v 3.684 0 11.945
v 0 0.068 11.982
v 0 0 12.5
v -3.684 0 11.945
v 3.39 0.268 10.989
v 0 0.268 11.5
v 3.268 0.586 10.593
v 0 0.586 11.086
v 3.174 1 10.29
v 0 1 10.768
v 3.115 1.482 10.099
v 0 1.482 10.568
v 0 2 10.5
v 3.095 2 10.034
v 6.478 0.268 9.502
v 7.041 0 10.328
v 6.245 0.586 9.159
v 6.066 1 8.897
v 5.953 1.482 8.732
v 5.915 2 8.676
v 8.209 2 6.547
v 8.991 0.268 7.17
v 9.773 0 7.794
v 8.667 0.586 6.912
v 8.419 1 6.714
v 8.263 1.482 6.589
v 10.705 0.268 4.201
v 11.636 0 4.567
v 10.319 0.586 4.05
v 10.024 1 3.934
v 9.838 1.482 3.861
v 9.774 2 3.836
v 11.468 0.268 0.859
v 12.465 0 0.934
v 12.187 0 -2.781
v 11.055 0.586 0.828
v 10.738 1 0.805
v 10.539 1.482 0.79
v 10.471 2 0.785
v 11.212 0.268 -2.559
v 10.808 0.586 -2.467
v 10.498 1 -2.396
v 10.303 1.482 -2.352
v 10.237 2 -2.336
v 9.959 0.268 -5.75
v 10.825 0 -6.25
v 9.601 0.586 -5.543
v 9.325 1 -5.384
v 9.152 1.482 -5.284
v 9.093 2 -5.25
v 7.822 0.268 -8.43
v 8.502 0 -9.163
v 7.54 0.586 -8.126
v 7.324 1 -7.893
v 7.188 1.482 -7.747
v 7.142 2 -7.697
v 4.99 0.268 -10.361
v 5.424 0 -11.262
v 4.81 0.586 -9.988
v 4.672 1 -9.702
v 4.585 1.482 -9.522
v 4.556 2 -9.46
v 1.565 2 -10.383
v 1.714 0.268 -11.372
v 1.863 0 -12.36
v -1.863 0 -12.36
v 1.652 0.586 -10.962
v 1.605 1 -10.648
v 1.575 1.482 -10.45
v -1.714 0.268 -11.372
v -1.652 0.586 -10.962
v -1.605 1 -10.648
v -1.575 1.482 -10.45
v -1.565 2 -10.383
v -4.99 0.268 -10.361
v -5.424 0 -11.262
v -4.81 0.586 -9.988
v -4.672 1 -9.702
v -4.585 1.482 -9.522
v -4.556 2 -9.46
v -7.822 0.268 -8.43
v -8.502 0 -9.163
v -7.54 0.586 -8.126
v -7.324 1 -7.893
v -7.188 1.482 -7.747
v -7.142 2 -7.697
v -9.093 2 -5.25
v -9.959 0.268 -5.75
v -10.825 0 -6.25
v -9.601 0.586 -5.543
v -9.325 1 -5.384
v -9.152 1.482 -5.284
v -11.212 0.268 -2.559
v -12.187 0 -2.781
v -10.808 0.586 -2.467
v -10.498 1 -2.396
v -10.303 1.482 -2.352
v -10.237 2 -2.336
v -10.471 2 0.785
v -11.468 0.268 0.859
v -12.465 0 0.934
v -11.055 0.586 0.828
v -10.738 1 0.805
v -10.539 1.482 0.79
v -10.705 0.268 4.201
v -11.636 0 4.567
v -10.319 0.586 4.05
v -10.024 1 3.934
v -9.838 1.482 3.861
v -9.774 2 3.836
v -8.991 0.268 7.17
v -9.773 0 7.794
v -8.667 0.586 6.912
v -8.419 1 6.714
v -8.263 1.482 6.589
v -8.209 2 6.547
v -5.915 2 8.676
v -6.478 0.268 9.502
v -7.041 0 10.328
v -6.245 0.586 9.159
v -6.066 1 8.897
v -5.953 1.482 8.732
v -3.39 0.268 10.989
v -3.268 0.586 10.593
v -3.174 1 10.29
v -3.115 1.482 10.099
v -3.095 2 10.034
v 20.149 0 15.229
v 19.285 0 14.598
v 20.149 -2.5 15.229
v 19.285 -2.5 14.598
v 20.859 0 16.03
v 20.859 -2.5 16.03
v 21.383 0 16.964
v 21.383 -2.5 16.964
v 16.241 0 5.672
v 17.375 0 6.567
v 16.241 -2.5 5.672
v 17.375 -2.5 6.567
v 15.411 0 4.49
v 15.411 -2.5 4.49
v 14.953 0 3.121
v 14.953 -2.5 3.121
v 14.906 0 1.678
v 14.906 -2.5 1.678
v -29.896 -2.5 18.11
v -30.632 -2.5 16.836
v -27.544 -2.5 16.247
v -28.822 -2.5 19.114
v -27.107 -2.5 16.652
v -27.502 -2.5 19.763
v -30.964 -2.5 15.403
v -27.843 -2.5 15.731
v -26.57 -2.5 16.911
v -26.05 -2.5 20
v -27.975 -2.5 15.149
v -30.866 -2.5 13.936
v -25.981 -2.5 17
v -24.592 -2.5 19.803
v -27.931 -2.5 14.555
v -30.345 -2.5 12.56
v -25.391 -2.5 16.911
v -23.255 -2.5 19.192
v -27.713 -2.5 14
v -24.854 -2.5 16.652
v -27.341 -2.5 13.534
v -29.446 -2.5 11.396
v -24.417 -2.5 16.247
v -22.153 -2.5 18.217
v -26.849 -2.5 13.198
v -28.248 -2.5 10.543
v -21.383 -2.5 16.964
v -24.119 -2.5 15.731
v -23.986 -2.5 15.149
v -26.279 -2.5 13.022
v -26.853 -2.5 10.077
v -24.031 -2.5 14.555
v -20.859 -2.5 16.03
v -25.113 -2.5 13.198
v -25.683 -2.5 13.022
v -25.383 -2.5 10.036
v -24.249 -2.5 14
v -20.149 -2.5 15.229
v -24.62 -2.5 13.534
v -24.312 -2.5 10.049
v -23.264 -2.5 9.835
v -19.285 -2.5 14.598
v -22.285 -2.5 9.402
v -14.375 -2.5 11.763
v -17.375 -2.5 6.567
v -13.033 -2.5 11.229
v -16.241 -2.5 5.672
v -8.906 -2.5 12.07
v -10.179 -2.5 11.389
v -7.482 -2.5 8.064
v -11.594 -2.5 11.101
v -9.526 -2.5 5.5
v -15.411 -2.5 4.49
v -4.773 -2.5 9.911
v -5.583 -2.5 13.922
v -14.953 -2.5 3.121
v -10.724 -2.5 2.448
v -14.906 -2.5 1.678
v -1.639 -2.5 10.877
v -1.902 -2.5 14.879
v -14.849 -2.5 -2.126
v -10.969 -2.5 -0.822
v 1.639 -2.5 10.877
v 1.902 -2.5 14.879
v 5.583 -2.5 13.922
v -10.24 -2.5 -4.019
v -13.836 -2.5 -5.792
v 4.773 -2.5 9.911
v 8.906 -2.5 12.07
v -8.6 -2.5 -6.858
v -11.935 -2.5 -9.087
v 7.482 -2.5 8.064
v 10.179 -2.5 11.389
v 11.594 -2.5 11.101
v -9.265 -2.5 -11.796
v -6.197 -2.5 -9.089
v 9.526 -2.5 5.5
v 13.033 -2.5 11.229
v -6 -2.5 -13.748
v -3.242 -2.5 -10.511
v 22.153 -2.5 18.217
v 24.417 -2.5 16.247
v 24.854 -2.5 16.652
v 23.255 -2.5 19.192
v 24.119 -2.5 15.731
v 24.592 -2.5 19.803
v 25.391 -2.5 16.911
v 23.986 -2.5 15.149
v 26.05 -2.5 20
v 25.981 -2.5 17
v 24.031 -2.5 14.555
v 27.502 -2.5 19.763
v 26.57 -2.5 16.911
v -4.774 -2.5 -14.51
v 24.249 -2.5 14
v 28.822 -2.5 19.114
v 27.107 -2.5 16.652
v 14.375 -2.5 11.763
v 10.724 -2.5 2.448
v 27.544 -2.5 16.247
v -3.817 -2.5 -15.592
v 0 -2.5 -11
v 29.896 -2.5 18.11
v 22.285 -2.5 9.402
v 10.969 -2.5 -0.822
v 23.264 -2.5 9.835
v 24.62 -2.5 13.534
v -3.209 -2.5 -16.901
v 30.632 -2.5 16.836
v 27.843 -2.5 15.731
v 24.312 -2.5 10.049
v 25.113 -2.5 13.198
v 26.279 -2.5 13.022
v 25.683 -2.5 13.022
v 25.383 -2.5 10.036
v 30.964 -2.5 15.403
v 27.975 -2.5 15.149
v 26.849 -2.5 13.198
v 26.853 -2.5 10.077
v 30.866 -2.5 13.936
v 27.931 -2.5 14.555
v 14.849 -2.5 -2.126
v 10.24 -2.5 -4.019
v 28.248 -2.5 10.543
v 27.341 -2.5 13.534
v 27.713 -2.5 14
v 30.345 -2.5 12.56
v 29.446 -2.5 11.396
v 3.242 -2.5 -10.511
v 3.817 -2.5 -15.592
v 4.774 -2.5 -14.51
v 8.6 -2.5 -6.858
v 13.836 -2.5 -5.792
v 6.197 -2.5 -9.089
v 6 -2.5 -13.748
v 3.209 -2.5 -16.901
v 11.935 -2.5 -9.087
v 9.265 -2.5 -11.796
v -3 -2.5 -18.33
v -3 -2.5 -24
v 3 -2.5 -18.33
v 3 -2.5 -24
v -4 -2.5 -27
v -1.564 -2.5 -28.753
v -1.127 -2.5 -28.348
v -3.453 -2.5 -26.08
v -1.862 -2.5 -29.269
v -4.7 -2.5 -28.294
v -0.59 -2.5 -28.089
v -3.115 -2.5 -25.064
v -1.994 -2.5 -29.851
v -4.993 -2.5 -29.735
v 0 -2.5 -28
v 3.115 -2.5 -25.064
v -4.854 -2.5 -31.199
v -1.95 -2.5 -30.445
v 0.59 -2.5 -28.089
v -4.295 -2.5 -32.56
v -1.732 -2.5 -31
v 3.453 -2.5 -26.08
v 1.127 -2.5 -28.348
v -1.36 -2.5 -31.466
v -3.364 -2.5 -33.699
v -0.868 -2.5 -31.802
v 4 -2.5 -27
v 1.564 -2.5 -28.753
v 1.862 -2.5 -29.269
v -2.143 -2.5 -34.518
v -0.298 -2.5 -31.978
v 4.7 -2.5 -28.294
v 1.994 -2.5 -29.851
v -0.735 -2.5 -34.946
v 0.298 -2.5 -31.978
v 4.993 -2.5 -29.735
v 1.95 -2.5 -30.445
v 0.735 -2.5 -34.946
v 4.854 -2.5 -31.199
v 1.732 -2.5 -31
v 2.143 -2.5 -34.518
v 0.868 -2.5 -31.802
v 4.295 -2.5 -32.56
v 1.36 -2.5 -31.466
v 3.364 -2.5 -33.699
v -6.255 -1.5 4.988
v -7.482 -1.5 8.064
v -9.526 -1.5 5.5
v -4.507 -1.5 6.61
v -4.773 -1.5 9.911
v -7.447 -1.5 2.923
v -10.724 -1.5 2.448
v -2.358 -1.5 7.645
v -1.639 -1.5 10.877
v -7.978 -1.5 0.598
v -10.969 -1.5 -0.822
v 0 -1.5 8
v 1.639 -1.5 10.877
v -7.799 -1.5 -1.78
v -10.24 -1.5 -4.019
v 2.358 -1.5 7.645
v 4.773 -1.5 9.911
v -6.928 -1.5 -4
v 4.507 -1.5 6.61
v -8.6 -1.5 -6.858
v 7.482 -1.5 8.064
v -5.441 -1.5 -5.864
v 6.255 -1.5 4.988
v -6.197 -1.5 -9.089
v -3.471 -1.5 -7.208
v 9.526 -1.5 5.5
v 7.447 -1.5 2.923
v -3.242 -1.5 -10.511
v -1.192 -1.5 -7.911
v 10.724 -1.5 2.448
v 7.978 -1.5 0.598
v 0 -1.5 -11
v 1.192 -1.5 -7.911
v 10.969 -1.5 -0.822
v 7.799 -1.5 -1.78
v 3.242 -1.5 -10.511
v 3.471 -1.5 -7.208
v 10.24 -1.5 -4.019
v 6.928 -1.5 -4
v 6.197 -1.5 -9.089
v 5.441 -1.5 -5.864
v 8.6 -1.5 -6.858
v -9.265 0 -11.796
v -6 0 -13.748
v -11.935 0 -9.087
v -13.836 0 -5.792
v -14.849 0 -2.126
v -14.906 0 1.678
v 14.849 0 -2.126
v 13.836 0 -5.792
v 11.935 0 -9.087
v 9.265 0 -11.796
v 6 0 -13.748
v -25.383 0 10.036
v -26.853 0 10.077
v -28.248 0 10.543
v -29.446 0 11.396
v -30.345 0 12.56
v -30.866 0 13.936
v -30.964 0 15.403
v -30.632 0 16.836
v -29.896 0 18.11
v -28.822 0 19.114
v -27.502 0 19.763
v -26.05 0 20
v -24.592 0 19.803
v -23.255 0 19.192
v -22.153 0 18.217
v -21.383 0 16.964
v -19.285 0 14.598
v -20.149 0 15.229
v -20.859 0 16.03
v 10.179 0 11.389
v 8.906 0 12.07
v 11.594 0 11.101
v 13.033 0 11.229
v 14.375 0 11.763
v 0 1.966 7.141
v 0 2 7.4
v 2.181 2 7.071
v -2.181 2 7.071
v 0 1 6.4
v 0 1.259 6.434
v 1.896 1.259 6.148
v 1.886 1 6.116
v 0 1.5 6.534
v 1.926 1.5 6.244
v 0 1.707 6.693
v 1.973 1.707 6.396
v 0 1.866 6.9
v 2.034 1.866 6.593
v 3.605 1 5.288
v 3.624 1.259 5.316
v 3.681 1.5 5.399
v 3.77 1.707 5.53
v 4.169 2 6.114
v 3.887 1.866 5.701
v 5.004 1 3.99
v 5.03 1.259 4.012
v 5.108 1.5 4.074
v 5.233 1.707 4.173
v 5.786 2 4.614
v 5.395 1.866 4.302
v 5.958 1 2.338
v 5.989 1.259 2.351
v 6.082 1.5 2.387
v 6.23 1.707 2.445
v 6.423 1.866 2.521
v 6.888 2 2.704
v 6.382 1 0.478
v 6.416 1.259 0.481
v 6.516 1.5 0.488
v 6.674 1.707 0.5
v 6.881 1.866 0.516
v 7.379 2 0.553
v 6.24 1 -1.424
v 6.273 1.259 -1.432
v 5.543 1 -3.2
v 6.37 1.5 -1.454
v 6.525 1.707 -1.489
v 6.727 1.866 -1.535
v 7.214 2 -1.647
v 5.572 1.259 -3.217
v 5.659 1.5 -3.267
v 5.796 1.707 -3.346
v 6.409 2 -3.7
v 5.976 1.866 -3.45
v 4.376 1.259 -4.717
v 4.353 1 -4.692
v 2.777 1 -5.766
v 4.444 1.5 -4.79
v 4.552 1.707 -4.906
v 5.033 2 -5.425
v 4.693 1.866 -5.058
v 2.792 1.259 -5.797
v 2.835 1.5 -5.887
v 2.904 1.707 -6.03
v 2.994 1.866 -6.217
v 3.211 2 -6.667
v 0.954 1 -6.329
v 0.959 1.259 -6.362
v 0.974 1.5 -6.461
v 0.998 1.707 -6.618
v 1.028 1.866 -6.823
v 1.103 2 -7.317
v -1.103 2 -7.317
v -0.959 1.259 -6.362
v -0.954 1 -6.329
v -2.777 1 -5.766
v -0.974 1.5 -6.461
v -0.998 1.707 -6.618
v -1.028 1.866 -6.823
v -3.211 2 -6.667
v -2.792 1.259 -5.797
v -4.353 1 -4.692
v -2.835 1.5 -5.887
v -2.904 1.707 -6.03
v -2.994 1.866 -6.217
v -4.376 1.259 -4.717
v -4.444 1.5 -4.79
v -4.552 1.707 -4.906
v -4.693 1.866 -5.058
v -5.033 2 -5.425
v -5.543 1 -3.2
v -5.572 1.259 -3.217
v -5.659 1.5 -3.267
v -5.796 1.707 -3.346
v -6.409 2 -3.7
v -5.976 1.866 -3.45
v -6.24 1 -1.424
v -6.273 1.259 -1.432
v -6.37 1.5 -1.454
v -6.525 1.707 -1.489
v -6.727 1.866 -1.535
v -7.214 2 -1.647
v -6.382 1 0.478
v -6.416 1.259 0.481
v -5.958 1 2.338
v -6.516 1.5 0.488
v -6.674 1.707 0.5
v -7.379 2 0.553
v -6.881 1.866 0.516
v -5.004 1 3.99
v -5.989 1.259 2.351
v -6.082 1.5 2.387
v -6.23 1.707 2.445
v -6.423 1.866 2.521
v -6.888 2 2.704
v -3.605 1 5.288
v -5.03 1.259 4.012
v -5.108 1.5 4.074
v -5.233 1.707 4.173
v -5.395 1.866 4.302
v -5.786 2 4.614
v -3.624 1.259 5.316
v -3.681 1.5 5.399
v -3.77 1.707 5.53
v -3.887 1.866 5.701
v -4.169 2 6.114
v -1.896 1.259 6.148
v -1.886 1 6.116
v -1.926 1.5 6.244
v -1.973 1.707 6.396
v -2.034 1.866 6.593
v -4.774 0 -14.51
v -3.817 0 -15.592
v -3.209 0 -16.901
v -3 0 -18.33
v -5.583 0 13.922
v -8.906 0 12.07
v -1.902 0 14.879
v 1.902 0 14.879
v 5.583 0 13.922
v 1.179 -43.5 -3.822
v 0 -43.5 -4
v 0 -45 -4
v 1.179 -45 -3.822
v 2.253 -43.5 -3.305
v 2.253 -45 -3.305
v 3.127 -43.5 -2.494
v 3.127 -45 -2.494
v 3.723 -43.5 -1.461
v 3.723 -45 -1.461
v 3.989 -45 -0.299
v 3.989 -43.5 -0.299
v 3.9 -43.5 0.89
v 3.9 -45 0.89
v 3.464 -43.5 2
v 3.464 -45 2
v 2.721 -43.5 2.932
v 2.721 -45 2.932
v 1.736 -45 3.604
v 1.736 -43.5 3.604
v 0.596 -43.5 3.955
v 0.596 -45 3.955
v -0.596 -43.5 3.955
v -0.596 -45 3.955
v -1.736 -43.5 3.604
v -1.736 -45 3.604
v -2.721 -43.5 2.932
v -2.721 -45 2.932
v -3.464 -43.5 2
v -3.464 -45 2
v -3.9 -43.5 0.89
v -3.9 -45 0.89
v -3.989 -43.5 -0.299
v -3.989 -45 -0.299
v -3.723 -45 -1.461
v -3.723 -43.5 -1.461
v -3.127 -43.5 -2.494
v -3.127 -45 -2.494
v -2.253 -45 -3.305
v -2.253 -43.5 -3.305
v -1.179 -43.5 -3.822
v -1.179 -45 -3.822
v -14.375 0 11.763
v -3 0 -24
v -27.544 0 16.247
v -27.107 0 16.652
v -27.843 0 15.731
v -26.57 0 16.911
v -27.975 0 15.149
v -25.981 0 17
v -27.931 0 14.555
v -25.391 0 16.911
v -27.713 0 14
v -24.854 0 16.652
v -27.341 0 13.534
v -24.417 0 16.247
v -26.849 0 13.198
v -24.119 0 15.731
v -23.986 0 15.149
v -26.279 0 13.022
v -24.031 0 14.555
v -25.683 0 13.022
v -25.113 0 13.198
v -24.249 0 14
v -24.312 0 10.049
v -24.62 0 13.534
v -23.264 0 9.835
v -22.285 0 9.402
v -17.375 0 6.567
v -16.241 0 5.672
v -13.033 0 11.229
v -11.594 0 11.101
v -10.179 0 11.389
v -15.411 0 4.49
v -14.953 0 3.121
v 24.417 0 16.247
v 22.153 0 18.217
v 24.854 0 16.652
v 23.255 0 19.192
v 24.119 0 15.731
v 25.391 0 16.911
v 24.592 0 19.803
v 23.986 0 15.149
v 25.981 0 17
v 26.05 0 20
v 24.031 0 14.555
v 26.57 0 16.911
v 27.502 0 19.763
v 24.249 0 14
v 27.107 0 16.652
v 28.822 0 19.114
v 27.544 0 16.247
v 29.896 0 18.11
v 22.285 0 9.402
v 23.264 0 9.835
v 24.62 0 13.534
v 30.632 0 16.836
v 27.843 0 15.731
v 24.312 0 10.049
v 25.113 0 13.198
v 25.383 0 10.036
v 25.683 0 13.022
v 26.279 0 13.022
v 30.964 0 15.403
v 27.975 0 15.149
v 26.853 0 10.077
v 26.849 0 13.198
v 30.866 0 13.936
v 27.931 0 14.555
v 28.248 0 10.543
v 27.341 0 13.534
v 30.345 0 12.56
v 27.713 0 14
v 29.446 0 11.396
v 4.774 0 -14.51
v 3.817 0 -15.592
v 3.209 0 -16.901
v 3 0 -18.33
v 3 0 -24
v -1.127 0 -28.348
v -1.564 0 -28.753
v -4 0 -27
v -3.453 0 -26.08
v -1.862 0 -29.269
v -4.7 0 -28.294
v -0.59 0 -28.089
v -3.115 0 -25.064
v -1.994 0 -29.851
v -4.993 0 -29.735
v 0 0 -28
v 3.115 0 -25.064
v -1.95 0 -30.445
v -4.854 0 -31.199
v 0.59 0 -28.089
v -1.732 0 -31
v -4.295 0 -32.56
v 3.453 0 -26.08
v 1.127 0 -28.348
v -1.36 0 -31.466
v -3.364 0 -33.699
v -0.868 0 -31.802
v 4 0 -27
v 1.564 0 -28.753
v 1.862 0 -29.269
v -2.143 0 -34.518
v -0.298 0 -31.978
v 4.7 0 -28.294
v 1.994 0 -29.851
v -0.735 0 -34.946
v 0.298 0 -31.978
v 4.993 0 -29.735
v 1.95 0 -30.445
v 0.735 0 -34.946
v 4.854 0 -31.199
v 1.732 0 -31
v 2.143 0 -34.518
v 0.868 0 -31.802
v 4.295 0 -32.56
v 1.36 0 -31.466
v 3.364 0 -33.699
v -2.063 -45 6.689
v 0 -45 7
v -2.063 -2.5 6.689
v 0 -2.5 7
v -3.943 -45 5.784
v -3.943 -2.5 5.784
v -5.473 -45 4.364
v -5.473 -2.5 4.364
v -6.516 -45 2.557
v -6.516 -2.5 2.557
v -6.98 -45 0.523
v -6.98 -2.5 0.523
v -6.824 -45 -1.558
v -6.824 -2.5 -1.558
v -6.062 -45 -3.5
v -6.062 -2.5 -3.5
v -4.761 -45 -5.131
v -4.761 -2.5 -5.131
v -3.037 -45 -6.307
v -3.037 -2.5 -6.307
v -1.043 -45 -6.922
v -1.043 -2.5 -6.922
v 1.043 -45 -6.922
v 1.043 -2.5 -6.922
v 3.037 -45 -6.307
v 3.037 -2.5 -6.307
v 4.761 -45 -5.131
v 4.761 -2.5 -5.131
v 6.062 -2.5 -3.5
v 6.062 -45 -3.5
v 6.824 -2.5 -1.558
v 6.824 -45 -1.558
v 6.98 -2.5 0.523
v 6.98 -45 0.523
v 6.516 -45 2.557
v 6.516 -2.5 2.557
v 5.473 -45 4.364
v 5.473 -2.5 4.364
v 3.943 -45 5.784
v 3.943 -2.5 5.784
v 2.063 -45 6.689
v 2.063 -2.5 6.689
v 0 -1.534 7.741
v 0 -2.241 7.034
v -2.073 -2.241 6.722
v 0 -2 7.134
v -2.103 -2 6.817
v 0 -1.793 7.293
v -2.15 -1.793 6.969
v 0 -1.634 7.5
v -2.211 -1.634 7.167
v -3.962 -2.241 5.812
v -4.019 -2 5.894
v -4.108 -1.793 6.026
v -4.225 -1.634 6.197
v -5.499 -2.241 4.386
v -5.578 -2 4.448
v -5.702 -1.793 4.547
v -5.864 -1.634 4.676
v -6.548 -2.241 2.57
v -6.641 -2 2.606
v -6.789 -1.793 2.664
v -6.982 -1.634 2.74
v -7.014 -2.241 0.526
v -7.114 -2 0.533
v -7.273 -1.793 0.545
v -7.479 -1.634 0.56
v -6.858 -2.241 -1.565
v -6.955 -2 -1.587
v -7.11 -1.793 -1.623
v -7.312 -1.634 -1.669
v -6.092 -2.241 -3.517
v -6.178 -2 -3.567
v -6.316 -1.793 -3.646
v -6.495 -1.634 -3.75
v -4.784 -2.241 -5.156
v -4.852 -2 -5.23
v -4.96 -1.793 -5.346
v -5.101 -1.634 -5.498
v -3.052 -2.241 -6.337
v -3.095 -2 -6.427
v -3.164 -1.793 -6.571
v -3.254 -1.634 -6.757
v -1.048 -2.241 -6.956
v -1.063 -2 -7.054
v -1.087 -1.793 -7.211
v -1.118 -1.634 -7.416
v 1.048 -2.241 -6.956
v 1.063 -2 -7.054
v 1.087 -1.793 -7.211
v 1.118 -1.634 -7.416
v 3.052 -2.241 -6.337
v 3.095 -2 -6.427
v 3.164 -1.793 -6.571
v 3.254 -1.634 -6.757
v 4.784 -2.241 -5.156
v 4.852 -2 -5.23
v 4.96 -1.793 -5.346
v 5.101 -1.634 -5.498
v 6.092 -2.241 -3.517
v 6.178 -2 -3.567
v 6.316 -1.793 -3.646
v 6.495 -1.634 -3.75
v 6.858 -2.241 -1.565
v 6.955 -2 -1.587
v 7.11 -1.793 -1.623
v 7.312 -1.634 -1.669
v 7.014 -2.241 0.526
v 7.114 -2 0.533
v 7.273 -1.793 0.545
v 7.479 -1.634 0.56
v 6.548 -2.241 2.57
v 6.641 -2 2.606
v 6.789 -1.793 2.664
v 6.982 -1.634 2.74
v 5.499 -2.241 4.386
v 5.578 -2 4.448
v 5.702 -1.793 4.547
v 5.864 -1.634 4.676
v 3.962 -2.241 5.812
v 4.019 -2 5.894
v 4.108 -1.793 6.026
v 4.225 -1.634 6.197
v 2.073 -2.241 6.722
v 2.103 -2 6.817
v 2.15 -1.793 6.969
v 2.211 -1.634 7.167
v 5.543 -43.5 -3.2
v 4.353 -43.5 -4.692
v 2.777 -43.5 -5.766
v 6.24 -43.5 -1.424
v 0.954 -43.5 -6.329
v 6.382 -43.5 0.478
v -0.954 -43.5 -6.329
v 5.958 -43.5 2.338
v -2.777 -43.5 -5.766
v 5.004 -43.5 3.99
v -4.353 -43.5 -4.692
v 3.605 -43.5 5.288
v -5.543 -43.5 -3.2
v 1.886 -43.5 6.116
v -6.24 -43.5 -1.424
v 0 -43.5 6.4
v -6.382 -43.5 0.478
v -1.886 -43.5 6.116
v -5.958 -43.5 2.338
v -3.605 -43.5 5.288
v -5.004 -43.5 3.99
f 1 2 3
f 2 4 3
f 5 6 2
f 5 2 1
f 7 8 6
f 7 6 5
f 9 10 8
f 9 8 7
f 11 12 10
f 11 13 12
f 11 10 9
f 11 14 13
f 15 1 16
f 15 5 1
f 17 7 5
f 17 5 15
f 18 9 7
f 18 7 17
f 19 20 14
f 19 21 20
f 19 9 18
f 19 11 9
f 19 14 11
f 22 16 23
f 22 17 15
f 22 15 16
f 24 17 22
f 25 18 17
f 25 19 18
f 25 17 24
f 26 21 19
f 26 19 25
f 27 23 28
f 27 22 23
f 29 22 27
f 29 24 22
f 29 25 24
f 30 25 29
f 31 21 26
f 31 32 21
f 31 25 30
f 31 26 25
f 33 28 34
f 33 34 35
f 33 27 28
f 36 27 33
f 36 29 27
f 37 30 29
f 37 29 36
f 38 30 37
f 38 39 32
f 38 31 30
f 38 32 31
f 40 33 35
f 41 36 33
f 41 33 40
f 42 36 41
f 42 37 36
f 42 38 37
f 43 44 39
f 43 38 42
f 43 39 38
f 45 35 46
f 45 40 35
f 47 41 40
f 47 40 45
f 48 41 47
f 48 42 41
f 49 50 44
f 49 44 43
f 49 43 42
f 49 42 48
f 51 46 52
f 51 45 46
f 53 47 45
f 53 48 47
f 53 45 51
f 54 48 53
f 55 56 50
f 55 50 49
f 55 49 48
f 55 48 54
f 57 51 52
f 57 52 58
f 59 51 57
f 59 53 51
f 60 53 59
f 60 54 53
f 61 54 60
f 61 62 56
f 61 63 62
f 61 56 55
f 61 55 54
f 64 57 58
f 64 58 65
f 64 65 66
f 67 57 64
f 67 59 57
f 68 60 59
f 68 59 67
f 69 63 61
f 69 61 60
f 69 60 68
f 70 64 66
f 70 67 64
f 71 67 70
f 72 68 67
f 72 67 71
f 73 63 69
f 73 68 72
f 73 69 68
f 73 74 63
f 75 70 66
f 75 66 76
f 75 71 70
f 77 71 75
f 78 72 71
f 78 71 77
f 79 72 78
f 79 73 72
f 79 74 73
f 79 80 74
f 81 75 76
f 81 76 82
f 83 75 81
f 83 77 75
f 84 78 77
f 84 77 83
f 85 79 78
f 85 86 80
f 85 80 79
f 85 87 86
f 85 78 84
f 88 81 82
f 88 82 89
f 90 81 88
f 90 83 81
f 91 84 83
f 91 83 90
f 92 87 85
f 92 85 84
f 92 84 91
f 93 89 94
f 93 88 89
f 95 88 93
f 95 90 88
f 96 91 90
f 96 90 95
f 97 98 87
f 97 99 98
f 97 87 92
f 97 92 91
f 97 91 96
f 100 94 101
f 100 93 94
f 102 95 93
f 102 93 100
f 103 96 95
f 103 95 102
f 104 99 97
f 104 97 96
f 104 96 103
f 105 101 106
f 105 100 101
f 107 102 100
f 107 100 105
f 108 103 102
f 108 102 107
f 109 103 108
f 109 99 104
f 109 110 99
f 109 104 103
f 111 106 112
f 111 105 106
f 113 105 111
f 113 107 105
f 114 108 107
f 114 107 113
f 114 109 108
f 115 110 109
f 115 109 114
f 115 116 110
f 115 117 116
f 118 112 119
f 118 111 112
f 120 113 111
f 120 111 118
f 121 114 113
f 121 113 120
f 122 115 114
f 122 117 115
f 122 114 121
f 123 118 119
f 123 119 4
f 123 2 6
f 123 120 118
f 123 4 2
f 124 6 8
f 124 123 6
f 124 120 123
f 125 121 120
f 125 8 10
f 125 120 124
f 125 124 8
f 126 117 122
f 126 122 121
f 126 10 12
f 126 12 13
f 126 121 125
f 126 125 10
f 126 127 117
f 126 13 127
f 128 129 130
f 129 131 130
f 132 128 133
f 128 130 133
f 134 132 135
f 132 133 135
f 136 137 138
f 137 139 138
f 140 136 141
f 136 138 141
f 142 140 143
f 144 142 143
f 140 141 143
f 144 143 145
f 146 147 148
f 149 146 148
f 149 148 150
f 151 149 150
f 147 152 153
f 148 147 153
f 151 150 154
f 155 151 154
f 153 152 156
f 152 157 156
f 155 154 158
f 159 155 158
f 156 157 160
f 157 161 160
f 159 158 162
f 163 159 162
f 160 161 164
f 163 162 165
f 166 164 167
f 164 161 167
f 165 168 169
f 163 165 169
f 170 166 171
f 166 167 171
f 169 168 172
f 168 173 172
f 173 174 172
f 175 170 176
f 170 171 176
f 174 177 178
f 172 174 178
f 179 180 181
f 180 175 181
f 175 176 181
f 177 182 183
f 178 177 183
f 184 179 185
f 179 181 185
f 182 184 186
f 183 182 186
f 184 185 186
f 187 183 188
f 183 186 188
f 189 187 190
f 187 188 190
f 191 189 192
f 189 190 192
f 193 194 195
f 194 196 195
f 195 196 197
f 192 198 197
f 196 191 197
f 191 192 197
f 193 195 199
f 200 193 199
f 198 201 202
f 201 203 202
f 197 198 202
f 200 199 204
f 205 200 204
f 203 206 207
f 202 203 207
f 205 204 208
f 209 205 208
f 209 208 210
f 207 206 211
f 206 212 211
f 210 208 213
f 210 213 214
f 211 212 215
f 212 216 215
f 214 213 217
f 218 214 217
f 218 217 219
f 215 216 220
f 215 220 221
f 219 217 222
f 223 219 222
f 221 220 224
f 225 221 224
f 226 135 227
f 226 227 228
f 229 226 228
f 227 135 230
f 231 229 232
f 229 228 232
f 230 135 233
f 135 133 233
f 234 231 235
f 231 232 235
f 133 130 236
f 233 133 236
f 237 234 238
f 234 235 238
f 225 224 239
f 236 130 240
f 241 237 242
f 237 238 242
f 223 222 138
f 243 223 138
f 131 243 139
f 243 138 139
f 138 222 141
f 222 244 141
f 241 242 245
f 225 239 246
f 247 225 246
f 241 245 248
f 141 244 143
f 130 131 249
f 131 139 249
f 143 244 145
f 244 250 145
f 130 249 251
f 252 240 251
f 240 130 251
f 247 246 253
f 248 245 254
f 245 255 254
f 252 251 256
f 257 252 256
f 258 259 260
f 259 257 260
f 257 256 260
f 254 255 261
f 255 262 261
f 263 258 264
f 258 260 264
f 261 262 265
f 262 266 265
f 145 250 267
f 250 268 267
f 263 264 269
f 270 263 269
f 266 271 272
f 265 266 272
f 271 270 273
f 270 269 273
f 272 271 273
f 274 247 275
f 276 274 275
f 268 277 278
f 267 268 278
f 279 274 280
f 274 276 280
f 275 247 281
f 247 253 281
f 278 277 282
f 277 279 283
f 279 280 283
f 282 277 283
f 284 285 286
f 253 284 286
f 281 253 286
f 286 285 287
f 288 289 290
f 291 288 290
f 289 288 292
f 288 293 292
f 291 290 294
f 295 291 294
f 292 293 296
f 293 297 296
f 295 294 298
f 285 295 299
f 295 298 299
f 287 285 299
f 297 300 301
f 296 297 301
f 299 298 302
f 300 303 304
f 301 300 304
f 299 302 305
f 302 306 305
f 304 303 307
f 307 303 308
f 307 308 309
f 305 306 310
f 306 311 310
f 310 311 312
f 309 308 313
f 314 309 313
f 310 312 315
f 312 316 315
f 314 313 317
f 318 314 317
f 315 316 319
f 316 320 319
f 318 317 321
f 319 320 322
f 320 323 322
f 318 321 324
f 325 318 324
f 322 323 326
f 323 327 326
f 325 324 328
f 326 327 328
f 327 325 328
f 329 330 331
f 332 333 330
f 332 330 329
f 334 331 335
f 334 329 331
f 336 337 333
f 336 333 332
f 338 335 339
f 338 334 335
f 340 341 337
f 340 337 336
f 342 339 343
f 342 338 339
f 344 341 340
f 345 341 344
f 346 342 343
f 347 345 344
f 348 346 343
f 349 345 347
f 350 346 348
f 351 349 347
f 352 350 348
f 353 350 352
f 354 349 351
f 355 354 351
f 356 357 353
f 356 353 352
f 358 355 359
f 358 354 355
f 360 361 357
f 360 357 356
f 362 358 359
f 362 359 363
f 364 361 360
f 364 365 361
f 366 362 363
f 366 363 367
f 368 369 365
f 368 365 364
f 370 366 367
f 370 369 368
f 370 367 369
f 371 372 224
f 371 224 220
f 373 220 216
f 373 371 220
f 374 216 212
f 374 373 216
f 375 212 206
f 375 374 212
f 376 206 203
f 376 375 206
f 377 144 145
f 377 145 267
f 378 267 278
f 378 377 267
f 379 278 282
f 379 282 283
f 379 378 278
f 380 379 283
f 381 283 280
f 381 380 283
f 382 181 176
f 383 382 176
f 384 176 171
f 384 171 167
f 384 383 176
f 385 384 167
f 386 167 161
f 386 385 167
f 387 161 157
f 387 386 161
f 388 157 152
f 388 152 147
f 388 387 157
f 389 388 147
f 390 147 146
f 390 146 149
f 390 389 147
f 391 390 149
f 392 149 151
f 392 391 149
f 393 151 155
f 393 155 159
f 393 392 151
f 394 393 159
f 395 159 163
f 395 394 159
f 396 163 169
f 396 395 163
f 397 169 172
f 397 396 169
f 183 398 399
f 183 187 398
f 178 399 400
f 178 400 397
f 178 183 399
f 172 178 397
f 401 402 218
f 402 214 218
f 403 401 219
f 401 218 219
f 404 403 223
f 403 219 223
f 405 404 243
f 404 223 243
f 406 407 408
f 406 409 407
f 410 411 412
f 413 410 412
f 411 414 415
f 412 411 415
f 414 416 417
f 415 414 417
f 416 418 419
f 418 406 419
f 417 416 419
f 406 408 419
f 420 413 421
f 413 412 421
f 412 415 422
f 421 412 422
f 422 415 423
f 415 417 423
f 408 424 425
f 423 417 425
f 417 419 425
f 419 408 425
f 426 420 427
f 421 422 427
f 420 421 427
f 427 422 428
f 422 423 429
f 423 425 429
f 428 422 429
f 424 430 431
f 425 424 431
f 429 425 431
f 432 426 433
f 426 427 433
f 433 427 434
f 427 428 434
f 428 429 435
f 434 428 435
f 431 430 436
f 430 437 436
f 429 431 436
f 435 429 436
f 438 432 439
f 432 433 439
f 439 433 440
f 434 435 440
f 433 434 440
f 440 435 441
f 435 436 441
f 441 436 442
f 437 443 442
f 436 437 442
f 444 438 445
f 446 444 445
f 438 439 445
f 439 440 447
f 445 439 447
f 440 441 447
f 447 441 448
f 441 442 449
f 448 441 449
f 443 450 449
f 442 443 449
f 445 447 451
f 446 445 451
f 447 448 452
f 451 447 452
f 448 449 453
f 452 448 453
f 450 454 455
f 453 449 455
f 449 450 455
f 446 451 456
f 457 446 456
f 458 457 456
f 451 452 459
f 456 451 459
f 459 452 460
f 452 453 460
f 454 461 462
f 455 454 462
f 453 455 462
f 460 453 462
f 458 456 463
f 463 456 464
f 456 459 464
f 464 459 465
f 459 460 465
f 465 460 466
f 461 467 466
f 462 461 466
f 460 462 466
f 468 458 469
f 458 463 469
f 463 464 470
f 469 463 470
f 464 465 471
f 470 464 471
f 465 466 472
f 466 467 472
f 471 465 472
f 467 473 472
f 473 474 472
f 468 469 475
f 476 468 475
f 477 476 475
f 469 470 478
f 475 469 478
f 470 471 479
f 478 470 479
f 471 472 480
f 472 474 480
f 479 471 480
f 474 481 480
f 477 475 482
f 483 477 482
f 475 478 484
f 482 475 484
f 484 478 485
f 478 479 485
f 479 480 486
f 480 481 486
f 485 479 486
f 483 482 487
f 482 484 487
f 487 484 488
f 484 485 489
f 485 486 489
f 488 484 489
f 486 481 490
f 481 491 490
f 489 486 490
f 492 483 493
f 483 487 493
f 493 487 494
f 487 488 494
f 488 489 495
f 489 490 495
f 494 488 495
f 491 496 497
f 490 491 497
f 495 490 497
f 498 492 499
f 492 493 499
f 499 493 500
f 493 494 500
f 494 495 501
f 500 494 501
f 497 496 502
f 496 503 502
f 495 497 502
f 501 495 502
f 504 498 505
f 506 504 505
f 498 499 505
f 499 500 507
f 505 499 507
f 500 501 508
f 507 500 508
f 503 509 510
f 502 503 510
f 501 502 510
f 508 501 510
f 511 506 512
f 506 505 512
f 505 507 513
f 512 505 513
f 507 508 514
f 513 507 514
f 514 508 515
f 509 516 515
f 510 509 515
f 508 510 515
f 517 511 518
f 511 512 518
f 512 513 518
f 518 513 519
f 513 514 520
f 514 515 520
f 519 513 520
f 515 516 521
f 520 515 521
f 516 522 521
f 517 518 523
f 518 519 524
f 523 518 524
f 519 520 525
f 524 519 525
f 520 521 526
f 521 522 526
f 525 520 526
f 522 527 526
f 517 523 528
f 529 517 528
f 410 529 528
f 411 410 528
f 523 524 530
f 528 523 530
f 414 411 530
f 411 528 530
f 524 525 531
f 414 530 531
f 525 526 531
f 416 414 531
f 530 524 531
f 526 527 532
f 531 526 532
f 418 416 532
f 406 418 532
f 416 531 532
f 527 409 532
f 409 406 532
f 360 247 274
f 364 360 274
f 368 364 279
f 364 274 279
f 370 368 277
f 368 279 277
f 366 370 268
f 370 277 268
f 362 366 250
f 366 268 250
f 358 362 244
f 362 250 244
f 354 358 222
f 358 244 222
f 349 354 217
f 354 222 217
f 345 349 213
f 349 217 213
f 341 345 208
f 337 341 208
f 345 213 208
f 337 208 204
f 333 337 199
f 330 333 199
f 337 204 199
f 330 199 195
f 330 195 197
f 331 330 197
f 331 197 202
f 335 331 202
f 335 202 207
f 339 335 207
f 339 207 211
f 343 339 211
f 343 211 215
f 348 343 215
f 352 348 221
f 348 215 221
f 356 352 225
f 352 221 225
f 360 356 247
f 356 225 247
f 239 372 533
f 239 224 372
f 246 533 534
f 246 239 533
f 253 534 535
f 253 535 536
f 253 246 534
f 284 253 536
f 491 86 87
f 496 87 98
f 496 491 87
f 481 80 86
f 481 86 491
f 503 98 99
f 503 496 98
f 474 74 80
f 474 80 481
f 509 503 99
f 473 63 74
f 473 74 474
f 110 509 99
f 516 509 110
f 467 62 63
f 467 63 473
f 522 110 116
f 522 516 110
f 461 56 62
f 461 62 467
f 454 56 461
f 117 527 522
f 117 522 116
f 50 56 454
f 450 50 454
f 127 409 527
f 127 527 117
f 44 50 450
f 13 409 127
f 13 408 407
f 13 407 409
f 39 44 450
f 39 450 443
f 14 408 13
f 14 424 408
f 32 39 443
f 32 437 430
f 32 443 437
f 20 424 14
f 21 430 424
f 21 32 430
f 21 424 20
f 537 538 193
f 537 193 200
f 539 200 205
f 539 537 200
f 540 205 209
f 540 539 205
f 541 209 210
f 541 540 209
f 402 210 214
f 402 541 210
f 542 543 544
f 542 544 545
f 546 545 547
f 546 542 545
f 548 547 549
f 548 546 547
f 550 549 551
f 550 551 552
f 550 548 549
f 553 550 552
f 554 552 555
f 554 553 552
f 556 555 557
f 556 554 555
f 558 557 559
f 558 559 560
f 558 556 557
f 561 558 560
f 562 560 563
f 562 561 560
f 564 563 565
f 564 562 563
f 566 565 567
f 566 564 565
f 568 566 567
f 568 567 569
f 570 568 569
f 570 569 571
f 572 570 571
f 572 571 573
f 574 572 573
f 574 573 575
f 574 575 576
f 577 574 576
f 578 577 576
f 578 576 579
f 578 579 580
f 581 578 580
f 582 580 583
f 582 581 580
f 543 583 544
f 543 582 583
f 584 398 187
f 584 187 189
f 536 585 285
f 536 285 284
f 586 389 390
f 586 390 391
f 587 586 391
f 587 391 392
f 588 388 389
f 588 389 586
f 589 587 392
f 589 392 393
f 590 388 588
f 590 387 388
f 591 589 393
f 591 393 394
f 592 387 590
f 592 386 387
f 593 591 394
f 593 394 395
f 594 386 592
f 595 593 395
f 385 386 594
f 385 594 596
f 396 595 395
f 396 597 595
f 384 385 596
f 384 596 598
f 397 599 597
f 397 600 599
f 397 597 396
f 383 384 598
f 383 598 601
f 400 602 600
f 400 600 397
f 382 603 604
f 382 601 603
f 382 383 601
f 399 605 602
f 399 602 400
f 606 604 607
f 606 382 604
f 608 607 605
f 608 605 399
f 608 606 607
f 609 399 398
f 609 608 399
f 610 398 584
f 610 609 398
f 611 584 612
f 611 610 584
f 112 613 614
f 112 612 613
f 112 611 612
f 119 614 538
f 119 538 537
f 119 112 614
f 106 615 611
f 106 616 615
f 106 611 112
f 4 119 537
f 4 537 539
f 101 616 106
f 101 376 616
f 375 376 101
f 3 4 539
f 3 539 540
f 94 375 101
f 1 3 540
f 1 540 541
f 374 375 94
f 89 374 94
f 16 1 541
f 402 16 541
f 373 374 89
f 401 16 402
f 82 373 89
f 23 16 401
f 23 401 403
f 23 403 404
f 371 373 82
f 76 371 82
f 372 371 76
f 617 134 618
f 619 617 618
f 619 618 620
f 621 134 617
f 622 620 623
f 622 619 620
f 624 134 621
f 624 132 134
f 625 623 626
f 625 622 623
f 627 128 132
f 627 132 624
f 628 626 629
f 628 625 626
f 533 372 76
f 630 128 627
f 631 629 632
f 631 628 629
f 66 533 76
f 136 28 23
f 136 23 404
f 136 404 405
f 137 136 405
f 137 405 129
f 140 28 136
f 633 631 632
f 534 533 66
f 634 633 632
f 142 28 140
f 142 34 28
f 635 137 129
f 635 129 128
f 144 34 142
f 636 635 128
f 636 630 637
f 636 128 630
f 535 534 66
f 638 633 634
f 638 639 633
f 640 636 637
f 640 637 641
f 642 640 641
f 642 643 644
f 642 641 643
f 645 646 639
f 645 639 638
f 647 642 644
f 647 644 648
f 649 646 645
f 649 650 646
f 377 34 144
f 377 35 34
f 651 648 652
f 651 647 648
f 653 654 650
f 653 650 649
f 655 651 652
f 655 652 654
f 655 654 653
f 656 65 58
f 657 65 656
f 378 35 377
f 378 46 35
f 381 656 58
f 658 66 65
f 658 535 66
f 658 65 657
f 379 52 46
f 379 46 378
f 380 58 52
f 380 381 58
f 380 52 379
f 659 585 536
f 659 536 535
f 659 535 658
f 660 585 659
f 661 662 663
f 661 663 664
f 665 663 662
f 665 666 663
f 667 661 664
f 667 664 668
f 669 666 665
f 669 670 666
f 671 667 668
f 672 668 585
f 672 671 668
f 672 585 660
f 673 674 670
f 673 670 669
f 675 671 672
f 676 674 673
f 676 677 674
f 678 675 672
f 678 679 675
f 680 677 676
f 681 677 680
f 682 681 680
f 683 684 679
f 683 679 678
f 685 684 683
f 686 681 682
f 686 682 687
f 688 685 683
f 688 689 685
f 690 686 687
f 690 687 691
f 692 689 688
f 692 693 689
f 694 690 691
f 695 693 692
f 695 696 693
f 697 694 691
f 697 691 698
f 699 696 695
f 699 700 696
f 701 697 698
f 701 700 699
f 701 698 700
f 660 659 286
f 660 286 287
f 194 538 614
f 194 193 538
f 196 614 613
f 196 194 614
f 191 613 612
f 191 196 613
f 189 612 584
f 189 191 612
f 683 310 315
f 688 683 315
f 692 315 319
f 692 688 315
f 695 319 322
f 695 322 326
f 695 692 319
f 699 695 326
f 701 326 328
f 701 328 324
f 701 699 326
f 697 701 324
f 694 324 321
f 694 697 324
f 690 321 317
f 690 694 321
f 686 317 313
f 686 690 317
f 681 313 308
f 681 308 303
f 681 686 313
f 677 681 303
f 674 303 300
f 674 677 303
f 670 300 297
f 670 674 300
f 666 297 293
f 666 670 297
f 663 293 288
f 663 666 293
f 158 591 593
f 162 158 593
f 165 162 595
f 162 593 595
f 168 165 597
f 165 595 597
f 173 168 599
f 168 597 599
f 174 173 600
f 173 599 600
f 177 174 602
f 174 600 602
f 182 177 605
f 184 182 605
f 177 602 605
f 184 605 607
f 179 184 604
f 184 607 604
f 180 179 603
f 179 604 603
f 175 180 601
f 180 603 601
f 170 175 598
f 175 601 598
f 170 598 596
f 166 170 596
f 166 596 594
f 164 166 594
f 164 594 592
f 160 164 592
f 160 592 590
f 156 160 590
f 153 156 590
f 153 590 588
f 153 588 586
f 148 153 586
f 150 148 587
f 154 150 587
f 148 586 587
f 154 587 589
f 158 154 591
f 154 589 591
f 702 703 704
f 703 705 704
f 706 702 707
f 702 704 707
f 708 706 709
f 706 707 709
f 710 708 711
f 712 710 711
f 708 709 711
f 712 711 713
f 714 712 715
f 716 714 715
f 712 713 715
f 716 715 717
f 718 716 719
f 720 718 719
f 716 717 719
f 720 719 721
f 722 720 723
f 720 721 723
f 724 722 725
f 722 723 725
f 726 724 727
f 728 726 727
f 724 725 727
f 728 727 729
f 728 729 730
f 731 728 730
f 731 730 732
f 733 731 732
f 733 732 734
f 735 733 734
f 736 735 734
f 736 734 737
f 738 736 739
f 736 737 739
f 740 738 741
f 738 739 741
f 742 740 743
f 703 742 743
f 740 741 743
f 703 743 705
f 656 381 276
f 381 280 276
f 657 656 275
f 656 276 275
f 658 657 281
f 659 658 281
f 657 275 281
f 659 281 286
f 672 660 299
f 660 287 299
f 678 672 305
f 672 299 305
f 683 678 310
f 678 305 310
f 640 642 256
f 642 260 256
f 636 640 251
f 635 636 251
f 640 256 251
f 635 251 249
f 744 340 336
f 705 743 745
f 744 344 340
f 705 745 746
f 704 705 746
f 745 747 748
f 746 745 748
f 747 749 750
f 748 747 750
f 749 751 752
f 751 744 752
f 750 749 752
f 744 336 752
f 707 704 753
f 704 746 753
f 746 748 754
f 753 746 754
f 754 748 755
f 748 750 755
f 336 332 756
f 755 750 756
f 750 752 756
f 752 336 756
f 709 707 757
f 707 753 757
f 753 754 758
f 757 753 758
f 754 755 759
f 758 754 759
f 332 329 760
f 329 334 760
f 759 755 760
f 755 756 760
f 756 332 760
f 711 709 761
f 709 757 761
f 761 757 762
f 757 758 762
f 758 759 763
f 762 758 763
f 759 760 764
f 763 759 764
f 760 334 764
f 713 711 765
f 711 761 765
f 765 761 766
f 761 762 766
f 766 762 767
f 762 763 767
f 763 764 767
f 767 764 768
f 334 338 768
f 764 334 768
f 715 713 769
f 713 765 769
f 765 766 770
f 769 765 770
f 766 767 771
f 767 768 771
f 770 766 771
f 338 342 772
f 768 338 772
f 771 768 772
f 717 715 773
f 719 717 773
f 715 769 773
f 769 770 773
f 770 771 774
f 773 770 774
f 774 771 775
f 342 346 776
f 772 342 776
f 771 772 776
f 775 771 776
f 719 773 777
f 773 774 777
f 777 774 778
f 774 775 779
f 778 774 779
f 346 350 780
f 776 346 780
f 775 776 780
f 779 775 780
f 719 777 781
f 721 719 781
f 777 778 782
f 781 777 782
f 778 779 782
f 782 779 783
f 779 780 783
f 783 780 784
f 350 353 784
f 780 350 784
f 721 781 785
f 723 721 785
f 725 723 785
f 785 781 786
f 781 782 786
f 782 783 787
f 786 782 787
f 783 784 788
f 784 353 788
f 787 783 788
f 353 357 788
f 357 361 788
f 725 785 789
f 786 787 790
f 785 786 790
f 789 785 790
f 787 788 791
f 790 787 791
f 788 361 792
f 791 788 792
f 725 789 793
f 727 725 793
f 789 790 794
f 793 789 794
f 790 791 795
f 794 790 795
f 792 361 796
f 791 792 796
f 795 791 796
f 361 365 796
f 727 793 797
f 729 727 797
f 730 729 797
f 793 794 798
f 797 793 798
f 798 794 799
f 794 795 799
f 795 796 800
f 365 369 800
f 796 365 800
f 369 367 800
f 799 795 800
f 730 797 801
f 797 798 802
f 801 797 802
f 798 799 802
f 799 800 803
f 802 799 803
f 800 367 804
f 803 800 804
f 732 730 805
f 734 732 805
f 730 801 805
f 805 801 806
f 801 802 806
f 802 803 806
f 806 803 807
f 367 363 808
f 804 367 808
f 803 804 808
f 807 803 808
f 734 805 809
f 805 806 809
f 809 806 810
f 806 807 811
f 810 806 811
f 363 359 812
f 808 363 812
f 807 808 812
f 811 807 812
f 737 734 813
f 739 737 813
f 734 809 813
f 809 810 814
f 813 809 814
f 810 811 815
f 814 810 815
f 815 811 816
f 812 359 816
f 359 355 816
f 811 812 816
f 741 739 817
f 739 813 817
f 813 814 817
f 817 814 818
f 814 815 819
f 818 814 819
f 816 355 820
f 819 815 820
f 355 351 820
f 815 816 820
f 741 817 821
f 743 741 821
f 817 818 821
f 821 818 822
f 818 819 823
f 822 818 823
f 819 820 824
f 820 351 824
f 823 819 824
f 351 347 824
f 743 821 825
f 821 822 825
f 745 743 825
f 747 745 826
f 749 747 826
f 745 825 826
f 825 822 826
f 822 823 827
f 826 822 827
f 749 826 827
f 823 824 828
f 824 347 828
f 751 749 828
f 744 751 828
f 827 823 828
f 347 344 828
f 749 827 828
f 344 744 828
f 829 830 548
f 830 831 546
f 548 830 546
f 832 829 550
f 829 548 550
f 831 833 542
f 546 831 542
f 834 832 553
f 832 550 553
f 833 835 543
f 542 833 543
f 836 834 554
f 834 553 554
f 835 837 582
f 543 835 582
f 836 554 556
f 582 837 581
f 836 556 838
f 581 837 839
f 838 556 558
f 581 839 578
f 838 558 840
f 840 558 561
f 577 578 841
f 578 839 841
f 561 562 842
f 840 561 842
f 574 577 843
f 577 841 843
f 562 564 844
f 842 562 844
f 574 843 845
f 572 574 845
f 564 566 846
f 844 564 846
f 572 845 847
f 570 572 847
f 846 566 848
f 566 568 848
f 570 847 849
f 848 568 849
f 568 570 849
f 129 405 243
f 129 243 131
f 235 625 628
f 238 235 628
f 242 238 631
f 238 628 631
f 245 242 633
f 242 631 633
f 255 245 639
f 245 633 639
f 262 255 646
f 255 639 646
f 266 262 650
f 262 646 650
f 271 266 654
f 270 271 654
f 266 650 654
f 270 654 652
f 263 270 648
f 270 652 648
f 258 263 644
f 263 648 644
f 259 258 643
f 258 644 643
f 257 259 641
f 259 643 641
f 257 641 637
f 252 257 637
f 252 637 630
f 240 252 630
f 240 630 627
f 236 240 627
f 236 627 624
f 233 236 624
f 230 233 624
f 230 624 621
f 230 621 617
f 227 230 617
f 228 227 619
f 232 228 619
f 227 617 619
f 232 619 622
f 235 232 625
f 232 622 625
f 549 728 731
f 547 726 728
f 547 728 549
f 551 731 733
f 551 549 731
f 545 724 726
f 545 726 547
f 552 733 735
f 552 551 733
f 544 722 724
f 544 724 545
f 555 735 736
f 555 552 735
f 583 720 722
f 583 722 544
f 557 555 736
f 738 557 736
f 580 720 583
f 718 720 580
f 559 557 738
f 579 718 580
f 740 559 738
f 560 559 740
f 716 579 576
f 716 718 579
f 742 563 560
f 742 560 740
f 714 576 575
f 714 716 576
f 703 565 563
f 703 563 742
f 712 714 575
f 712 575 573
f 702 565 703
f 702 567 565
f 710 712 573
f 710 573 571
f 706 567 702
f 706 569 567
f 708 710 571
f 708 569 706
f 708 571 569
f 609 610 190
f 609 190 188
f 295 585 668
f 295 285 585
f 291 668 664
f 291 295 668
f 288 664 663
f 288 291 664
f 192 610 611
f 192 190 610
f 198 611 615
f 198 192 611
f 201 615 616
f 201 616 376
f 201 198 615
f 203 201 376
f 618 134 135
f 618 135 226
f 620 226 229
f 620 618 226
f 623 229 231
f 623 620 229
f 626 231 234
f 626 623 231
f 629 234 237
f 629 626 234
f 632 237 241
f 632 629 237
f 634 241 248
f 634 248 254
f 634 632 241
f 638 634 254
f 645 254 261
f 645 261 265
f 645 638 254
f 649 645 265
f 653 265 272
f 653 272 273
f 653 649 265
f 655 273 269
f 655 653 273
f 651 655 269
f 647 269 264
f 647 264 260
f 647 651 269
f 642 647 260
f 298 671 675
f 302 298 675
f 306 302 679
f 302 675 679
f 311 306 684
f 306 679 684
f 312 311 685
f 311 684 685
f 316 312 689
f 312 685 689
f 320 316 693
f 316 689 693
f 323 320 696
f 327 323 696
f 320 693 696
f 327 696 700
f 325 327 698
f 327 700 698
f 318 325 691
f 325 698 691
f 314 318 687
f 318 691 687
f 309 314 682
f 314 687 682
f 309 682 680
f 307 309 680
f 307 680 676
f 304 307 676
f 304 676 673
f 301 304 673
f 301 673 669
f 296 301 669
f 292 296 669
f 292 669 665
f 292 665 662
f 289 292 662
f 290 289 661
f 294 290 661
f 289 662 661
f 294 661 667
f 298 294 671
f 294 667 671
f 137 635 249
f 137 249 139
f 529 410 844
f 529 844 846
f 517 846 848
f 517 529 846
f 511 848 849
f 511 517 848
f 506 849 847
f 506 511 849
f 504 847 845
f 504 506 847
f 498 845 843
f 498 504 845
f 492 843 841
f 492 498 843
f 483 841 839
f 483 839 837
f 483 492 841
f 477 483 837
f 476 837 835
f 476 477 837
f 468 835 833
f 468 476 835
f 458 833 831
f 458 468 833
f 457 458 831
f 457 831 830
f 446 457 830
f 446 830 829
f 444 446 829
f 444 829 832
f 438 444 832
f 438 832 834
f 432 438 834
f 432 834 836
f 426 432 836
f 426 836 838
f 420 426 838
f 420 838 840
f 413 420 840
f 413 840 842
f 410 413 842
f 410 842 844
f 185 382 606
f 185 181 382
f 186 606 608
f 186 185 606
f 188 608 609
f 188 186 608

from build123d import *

# Parameters (mm, degrees)
SKETCH_1_R          = 2
SKETCH_1_R_2        = 6.4
EXTRUDE_1_DEPTH     = 2.5
EXTRUDE_START       = 2
SKETCH_2_R          = 10.5
SKETCH_2_R_2        = 6.4
EXTRUDE_2_DEPTH     = 2
SKETCH_3_R          = 11
CUT_EXTRUDE_1_DEPTH = 1
SKETCH_4_R          = 7
SKETCH_4_R_2        = 6.4
EXTRUDE_3_DEPTH     = 42
FILLET_2_R          = 1
SKETCH_5_R          = 7
SKETCH_5_R_2        = 4
EXTRUDE_4_DEPTH     = 1.5
FILLET_3_R          = 5
FILLET_4_R          = 2


with BuildPart() as part:
    # 草图1 → 凸台-拉伸1 (new body)
    with BuildSketch(Plane(origin=(0, 0, 0), x_dir=(1, 0, 0), z_dir=(0, 1, 0))):
        with BuildLine():
            ThreePointArc((3, 26), (0, 35), (-3, 26))
            Line((-3, 26), (-3, 14.696938457))
            ThreePointArc((-3, 14.696938457), (-12.990381057, 7.5), (-14.227922061, -4.750393017))
            Line((-14.227922061, -4.750393017), (-24.016660498, -10.401923789))
            ThreePointArc((-24.016660498, -10.401923789), (-30.310889132, -17.5), (-21.016660498, -15.598076211))
            Line((-21.016660498, -15.598076211), (-11.227922061, -9.94654544))
            ThreePointArc((-11.227922061, -9.94654544), (0, -15), (11.227922061, -9.94654544))
            Line((11.227922061, -9.94654544), (21.016660498, -15.598076211))
            ThreePointArc((21.016660498, -15.598076211), (30.310889132, -17.5), (24.016660498, -10.401923789))
            Line((24.016660498, -10.401923789), (14.227922061, -4.750393017))
            ThreePointArc((14.227922061, -4.750393017), (12.990381057, 7.5), (3, 14.696938457))
            Line((3, 14.696938457), (3, 26))
        make_face()
        with Locations(Location((-25.980762114, -15, 0), (0, 0, 270))):
            Circle(SKETCH_1_R, mode=Mode.SUBTRACT)
        with Locations(Location((0, 0, 0), (0, 0, 270))):
            Circle(SKETCH_1_R_2, mode=Mode.SUBTRACT)
        with Locations(Location((0, 30, 0), (0, 0, 270))):
            Circle(SKETCH_1_R, mode=Mode.SUBTRACT)
        with Locations(Location((25.980762114, -15, 0), (0, 0, 270))):
            Circle(SKETCH_1_R, mode=Mode.SUBTRACT)
    extrude(amount=-EXTRUDE_1_DEPTH)

    # 草图2 → 凸台-拉伸2 (add)
    with BuildSketch(Plane(origin=(0, 0, 0), x_dir=(1, 0, 0), z_dir=(0, 1, 0)).offset(EXTRUDE_START)):
        with Locations(Location((0, 0, 0), (0, 0, 270))):
            Circle(SKETCH_2_R)
        with Locations(Location((0, 0, 0), (0, 0, 270))):
            Circle(SKETCH_2_R_2, mode=Mode.SUBTRACT)
    extrude(amount=-EXTRUDE_2_DEPTH)

    # 草图3 → 切除-拉伸1 (cut)
    with BuildSketch(Plane.XZ.offset(2.5)):
        with Locations(Location((0, 0, 0), (0, 0, 270))):
            Circle(SKETCH_3_R)
    extrude(amount=-CUT_EXTRUDE_1_DEPTH, mode=Mode.SUBTRACT)

    # 草图4 → 凸台-拉伸3 (add)
    with BuildSketch(Plane.XZ.offset(1.5)):
        with Locations(Location((0, 0, 0), (0, 0, 90))):
            Circle(SKETCH_4_R)
        with Locations(Location((0, 0, 0), (0, 0, 90))):
            Circle(SKETCH_4_R_2, mode=Mode.SUBTRACT)
    extrude(amount=EXTRUDE_3_DEPTH)

    # 圆角2
    fillet_2_edges = [part.edges().sort_by_distance(p)[0] for p in [
        (0, 2, -6.4),
        (0, -1.5, -7),
    ]]
    fillet(fillet_2_edges, radius=FILLET_2_R)

    # 草图5 → 凸台-拉伸4 (add)
    with BuildSketch(Plane.XZ.offset(43.5)):
        with Locations(Location((0, 0, 0), (0, 0, 90))):
            Circle(SKETCH_5_R)
        with Locations(Location((0, 0, 0), (0, 0, 270))):
            Circle(SKETCH_5_R_2, mode=Mode.SUBTRACT)
    extrude(amount=EXTRUDE_4_DEPTH)

    # 圆角3
    fillet_3_edges = [part.edges().sort_by_distance(p)[0] for p in [
        (-24.016660498, -1.25, 10.401923789),
        (-14.227922061, -1.25, 4.750393017),
        (-3, -1.25, -14.696938457),
        (-3, -1.25, -26),
        (3, -1.25, -26),
        (3, -1.25, -14.696938457),
        (14.227922061, -1.25, 4.750393017),
        (24.016660498, -1.25, 10.401923789),
        (21.016660498, -1.25, 15.598076211),
        (11.227922061, -1.25, 9.94654544),
        (-11.227922061, -1.25, 9.94654544),
        (-21.016660498, -1.25, 15.598076211),
    ]]
    fillet(fillet_3_edges, radius=FILLET_3_R)

    # 圆角4
    fillet_4_edges = [part.edges().sort_by_distance(p)[0] for p in [
        (0, 0, -10.5),
    ]]
    fillet(fillet_4_edges, radius=FILLET_4_R - 0.0001)  # a hair under: the kernel refuses the full size


solid = part.part
